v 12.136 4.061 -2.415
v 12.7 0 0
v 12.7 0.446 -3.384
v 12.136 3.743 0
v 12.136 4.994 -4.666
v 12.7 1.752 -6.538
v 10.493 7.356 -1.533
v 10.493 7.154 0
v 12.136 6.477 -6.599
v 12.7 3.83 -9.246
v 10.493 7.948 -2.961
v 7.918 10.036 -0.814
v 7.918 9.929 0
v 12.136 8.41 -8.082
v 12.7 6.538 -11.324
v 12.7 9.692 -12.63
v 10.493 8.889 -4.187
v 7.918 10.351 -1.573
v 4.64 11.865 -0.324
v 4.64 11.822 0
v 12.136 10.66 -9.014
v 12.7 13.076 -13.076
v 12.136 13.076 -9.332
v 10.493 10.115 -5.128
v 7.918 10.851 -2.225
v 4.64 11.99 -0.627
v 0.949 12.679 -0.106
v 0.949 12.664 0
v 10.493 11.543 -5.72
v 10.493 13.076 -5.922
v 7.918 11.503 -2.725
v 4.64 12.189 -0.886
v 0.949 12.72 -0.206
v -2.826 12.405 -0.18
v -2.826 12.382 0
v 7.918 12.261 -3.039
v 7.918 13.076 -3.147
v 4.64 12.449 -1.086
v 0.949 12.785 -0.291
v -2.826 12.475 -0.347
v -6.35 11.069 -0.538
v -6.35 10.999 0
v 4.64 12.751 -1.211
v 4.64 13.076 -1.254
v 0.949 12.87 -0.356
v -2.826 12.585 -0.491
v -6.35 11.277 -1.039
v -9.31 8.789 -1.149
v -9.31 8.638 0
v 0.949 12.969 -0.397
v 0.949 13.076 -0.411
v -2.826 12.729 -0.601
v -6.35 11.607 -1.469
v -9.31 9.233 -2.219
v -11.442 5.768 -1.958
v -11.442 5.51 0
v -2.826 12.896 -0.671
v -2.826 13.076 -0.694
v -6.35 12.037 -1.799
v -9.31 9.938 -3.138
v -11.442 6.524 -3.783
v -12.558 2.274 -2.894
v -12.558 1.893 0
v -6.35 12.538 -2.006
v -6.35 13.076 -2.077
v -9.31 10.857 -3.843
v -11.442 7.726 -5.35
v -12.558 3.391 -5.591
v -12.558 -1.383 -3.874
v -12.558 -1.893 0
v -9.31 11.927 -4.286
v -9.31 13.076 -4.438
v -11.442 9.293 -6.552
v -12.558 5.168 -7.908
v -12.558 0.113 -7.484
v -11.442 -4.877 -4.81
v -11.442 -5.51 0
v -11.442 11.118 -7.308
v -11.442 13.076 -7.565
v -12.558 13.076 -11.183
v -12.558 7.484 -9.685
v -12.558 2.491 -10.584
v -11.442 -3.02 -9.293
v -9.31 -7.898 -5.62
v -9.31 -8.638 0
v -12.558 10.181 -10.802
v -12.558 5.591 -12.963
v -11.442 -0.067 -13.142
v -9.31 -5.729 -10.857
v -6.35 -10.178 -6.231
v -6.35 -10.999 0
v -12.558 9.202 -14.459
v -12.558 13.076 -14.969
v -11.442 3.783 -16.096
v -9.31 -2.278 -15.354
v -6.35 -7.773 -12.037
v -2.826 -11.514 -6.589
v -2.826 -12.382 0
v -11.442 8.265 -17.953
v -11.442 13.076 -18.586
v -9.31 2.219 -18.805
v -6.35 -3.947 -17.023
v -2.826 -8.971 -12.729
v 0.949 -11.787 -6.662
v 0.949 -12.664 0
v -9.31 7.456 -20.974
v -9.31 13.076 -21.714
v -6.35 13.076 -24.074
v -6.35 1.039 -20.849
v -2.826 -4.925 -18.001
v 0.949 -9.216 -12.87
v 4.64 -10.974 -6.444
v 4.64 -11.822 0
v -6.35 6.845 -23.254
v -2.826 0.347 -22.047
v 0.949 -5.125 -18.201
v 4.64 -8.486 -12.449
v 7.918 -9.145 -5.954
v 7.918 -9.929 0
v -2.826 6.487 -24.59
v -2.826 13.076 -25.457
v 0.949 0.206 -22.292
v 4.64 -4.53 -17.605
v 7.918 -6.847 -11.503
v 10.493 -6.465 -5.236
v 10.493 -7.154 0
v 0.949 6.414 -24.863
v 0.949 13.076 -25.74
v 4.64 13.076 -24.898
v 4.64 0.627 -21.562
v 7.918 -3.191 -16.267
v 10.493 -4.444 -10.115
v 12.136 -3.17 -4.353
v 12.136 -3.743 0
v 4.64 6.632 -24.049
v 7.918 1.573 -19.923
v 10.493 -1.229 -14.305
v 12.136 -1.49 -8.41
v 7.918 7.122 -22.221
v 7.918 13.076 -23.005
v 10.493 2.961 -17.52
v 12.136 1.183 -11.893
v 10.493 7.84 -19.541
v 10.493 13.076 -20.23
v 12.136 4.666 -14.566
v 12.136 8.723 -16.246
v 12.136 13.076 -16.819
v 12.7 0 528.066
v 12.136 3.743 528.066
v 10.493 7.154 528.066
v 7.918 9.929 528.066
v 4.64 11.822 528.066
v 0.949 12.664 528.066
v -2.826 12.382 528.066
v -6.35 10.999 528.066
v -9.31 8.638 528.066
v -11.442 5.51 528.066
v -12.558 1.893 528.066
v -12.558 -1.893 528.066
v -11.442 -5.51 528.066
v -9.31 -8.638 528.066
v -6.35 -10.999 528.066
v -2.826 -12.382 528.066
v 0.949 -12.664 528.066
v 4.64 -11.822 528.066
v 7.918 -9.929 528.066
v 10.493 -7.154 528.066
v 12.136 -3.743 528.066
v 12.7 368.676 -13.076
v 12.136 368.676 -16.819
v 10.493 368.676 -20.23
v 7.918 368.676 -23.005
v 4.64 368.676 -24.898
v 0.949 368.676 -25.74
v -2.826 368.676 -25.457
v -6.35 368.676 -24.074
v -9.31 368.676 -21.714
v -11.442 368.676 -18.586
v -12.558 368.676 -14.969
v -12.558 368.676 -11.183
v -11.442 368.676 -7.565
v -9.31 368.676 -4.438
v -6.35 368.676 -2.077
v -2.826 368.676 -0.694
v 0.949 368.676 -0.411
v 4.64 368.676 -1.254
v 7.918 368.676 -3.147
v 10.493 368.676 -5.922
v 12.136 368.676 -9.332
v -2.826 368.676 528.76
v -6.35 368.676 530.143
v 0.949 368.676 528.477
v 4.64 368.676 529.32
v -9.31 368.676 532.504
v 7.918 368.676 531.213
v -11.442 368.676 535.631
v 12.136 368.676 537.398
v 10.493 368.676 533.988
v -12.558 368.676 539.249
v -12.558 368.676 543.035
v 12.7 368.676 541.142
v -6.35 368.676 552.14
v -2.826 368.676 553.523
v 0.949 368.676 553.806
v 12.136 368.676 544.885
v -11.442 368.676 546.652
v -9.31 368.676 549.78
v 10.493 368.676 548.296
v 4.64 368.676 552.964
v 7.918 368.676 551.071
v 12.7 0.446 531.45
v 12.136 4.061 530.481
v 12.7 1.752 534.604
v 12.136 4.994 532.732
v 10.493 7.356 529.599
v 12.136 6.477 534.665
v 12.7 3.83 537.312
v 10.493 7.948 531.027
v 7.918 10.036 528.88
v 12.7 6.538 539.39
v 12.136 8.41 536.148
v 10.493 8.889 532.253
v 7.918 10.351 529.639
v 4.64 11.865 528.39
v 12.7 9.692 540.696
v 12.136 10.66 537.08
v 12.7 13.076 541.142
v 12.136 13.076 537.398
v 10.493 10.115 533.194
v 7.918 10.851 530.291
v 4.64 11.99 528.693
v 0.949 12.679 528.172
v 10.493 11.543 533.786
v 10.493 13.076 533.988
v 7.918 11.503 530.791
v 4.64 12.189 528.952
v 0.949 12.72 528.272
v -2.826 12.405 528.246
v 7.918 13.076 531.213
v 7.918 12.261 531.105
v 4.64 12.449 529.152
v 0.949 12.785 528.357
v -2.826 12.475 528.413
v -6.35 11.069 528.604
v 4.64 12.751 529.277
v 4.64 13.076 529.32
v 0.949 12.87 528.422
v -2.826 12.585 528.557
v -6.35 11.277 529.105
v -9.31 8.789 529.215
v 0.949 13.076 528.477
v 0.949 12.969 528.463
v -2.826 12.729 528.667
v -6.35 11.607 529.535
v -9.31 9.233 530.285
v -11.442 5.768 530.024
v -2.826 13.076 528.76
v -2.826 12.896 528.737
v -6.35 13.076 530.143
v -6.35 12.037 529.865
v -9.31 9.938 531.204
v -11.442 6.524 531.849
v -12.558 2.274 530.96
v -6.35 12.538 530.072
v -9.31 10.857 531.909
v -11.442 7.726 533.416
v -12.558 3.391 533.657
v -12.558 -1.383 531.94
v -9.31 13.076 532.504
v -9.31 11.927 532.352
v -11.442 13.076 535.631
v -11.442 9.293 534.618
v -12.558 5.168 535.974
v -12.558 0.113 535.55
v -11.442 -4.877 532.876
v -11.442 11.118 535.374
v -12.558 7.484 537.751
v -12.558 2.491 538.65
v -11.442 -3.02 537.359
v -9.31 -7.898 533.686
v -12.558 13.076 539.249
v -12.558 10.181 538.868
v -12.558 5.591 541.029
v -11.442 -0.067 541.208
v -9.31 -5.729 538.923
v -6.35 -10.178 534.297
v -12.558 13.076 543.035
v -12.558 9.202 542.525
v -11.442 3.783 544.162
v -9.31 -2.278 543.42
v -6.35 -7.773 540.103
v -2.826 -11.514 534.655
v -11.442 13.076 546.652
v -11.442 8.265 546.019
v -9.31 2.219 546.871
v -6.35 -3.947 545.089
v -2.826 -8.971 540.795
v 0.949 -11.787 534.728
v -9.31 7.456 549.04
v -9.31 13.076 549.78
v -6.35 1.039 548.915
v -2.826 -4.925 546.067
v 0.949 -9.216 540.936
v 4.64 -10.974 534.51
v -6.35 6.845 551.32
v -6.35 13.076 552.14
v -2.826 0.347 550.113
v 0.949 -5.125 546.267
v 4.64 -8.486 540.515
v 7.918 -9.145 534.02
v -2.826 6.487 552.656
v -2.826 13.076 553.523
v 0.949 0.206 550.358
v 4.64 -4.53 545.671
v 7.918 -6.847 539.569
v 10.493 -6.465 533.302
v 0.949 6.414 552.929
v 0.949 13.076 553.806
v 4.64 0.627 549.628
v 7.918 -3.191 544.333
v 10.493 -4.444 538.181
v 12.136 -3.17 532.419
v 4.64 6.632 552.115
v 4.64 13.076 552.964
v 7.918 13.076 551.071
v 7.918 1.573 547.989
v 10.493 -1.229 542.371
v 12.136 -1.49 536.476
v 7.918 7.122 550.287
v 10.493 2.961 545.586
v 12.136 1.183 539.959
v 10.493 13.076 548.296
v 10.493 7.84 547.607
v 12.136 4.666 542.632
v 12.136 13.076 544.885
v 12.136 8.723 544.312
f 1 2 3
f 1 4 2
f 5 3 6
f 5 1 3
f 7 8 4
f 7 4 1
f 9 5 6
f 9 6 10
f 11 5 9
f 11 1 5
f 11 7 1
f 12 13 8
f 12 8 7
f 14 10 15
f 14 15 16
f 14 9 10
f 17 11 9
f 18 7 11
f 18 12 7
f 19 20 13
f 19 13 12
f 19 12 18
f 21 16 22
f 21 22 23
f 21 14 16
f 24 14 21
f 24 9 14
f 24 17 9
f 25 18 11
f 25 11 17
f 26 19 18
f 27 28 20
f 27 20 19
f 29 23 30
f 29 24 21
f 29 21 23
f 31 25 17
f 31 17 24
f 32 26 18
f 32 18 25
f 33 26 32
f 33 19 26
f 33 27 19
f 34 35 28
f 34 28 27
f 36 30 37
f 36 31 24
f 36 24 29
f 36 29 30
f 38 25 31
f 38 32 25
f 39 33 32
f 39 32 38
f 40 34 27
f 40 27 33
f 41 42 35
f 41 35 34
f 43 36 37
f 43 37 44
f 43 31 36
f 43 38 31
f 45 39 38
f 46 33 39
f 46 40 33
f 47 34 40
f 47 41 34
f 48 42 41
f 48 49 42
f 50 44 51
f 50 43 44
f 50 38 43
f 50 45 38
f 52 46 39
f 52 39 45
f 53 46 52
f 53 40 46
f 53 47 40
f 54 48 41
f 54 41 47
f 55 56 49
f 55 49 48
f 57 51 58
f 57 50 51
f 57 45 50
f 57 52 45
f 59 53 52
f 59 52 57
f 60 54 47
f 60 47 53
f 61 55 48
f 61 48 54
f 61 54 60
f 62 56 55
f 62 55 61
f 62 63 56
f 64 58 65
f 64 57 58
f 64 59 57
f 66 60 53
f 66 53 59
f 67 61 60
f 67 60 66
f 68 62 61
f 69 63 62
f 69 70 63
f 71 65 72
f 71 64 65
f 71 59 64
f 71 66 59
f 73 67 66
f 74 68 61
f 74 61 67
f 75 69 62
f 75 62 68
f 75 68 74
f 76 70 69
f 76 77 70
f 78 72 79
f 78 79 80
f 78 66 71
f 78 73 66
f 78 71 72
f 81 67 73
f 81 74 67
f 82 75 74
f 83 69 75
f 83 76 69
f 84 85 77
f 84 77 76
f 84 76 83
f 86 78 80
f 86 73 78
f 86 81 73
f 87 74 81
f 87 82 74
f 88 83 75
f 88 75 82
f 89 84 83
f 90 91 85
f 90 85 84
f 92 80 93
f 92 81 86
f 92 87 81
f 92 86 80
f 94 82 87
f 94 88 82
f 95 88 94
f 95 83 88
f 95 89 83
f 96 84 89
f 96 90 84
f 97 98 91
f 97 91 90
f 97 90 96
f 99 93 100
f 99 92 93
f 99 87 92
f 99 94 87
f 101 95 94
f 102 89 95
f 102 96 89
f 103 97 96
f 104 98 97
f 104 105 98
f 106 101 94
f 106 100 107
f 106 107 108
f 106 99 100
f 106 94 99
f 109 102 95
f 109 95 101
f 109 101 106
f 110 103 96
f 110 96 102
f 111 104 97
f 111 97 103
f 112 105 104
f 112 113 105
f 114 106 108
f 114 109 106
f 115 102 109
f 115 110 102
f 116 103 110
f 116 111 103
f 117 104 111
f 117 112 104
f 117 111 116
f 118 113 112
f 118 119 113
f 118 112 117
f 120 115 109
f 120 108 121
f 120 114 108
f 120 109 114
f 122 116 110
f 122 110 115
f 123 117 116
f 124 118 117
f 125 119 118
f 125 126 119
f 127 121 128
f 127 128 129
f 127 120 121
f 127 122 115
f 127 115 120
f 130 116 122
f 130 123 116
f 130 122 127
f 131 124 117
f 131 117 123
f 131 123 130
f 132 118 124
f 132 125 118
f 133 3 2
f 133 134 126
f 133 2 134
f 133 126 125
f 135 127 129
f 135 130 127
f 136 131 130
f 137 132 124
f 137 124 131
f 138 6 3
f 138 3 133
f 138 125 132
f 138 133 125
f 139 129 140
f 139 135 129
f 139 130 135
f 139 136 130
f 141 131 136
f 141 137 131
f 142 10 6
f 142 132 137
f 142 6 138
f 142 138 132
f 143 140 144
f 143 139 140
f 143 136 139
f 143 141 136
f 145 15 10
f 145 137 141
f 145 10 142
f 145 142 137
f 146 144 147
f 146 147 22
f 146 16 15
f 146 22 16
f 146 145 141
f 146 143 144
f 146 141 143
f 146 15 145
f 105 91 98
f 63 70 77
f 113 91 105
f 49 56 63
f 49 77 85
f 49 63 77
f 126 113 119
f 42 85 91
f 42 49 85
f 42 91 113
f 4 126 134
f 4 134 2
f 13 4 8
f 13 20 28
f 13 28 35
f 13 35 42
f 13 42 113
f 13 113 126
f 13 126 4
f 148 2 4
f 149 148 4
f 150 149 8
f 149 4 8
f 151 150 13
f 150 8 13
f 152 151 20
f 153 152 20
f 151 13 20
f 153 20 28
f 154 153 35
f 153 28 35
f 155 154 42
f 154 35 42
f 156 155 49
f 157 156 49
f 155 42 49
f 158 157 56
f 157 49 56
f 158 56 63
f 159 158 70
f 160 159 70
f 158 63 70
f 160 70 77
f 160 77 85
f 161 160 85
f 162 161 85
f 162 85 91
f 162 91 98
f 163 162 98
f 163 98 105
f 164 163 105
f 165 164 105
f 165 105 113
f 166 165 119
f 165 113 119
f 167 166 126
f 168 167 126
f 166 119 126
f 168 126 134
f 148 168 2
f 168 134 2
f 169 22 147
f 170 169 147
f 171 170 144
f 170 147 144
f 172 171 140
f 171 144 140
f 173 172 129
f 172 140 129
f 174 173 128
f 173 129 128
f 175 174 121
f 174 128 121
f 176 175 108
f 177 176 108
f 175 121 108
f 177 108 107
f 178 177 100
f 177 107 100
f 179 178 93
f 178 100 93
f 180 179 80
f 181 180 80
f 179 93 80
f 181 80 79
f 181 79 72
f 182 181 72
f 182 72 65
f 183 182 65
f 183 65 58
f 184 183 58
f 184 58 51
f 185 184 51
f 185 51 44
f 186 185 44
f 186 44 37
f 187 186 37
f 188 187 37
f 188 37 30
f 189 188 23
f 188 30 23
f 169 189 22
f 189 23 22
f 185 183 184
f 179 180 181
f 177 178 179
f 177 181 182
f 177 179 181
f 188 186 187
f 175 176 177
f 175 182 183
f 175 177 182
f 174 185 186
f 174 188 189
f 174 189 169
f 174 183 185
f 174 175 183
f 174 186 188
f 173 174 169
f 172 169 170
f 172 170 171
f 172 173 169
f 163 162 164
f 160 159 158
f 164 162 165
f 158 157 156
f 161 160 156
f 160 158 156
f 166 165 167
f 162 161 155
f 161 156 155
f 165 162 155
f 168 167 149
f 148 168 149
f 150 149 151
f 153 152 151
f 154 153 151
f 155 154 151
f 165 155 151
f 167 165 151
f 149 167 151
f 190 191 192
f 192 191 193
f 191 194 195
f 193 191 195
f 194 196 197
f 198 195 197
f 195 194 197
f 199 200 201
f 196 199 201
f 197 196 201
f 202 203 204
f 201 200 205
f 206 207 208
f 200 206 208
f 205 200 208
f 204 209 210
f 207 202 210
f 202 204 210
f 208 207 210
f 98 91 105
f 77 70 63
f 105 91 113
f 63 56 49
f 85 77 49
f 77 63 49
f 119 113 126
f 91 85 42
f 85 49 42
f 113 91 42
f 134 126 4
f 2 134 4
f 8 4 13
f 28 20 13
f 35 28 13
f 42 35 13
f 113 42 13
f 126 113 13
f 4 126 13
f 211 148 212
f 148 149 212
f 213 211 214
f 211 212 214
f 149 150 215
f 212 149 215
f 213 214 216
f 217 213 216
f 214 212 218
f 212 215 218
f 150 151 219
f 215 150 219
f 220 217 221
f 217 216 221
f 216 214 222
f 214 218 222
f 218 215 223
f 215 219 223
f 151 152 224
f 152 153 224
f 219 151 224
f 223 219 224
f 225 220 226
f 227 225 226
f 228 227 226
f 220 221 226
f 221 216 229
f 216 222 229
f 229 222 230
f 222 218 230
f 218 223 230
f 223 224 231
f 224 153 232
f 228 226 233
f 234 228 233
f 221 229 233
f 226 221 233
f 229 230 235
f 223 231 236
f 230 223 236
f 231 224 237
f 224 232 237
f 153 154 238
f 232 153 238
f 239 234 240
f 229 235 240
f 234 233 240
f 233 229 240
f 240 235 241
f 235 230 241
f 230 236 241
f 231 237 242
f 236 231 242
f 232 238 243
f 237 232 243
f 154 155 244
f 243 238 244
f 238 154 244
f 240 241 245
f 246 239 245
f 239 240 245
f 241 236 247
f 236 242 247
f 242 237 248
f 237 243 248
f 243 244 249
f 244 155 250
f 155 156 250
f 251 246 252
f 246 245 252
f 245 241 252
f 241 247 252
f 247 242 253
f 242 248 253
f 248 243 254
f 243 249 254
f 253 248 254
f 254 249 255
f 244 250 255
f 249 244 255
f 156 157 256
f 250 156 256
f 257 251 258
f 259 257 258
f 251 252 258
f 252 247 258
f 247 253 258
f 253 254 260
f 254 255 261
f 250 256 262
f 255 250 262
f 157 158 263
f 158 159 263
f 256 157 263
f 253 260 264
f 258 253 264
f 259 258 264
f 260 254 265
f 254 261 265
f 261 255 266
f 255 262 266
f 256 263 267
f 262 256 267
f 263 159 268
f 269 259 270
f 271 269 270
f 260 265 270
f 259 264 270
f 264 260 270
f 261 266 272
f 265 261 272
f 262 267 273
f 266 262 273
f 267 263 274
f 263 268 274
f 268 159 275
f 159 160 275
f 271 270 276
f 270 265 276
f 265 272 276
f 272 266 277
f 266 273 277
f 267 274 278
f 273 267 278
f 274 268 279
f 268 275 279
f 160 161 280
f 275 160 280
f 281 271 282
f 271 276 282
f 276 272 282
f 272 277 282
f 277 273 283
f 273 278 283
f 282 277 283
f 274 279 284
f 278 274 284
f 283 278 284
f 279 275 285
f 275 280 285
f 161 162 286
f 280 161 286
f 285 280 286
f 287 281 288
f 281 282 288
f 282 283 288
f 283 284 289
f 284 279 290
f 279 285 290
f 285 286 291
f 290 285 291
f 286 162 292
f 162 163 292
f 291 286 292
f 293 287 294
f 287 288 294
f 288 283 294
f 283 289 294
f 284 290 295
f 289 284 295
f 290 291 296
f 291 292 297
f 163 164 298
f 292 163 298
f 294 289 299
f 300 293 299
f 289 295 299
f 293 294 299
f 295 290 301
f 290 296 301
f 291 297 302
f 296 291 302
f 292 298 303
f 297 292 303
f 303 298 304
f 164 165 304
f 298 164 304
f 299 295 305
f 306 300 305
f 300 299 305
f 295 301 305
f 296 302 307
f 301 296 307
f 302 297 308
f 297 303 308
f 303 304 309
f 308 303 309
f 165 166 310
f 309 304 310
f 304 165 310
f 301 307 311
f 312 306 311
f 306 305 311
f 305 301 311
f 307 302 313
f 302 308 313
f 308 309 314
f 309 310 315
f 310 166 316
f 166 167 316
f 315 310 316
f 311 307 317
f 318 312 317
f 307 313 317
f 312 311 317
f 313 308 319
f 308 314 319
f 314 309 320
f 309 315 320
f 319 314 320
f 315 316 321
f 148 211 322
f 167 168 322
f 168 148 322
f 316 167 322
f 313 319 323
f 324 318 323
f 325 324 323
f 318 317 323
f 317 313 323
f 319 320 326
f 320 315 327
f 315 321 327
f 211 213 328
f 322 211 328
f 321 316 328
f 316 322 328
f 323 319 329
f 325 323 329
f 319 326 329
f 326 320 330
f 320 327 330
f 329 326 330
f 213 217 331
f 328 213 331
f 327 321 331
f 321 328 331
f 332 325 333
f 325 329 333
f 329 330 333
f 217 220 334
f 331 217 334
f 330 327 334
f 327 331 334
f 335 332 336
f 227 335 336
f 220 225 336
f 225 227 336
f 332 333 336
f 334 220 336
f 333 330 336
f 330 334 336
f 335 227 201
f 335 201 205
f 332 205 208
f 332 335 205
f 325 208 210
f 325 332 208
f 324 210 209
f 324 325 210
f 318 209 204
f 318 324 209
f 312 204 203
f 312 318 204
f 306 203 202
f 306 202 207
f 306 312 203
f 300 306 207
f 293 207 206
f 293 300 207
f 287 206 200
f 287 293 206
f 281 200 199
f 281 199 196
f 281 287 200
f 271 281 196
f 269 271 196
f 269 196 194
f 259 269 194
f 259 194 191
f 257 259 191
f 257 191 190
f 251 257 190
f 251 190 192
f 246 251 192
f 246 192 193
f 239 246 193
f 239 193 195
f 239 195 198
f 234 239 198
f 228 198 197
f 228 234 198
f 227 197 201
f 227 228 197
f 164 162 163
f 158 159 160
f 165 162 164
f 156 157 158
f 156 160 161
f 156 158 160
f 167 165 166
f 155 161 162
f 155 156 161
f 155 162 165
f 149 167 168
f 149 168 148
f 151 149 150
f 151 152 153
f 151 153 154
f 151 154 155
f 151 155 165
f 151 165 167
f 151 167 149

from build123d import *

# Parameters (mm, degrees)
SKETCH1_R           = 12.7
BOSS_EXTRUDE1_DEPTH = 528.066
SKETCH1_4_R         = 12.7
REVOLVE20_ANGLE     = 90
SKETCH8_R           = 12.7
BOSS_EXTRUDE2_DEPTH = 355.6


with BuildPart() as part:
    # Sketch1 → Boss-Extrude1 (new body)
    with BuildSketch(Plane.XY):
        Circle(SKETCH1_R)
    extrude(amount=BOSS_EXTRUDE1_DEPTH)


with BuildPart() as body_2:
    # Sketch1<4> → Revolve20 (revolve)
    with BuildSketch(Plane.XY):
        Circle(SKETCH1_4_R)
    revolve(axis=Axis((1001.058274446, 13.07577549, 0), (1, 0, 0)), revolution_arc=REVOLVE20_ANGLE)

    # Sketch8 → Boss-Extrude2 (add)
    with BuildSketch(Plane(origin=(0, 13.07577549, 0), x_dir=(1, 0, 0), z_dir=(0, 1, 0))):
        with Locations((0, 13.07577549)):
            Circle(SKETCH8_R)
    extrude(amount=BOSS_EXTRUDE2_DEPTH)


with BuildPart() as body_3:
    # Mirror2: mirrored copy
    add(body_2.part.mirror(Plane.XY.offset(264.033)))


solid = Compound([part.part, body_2.part, body_3.part])
